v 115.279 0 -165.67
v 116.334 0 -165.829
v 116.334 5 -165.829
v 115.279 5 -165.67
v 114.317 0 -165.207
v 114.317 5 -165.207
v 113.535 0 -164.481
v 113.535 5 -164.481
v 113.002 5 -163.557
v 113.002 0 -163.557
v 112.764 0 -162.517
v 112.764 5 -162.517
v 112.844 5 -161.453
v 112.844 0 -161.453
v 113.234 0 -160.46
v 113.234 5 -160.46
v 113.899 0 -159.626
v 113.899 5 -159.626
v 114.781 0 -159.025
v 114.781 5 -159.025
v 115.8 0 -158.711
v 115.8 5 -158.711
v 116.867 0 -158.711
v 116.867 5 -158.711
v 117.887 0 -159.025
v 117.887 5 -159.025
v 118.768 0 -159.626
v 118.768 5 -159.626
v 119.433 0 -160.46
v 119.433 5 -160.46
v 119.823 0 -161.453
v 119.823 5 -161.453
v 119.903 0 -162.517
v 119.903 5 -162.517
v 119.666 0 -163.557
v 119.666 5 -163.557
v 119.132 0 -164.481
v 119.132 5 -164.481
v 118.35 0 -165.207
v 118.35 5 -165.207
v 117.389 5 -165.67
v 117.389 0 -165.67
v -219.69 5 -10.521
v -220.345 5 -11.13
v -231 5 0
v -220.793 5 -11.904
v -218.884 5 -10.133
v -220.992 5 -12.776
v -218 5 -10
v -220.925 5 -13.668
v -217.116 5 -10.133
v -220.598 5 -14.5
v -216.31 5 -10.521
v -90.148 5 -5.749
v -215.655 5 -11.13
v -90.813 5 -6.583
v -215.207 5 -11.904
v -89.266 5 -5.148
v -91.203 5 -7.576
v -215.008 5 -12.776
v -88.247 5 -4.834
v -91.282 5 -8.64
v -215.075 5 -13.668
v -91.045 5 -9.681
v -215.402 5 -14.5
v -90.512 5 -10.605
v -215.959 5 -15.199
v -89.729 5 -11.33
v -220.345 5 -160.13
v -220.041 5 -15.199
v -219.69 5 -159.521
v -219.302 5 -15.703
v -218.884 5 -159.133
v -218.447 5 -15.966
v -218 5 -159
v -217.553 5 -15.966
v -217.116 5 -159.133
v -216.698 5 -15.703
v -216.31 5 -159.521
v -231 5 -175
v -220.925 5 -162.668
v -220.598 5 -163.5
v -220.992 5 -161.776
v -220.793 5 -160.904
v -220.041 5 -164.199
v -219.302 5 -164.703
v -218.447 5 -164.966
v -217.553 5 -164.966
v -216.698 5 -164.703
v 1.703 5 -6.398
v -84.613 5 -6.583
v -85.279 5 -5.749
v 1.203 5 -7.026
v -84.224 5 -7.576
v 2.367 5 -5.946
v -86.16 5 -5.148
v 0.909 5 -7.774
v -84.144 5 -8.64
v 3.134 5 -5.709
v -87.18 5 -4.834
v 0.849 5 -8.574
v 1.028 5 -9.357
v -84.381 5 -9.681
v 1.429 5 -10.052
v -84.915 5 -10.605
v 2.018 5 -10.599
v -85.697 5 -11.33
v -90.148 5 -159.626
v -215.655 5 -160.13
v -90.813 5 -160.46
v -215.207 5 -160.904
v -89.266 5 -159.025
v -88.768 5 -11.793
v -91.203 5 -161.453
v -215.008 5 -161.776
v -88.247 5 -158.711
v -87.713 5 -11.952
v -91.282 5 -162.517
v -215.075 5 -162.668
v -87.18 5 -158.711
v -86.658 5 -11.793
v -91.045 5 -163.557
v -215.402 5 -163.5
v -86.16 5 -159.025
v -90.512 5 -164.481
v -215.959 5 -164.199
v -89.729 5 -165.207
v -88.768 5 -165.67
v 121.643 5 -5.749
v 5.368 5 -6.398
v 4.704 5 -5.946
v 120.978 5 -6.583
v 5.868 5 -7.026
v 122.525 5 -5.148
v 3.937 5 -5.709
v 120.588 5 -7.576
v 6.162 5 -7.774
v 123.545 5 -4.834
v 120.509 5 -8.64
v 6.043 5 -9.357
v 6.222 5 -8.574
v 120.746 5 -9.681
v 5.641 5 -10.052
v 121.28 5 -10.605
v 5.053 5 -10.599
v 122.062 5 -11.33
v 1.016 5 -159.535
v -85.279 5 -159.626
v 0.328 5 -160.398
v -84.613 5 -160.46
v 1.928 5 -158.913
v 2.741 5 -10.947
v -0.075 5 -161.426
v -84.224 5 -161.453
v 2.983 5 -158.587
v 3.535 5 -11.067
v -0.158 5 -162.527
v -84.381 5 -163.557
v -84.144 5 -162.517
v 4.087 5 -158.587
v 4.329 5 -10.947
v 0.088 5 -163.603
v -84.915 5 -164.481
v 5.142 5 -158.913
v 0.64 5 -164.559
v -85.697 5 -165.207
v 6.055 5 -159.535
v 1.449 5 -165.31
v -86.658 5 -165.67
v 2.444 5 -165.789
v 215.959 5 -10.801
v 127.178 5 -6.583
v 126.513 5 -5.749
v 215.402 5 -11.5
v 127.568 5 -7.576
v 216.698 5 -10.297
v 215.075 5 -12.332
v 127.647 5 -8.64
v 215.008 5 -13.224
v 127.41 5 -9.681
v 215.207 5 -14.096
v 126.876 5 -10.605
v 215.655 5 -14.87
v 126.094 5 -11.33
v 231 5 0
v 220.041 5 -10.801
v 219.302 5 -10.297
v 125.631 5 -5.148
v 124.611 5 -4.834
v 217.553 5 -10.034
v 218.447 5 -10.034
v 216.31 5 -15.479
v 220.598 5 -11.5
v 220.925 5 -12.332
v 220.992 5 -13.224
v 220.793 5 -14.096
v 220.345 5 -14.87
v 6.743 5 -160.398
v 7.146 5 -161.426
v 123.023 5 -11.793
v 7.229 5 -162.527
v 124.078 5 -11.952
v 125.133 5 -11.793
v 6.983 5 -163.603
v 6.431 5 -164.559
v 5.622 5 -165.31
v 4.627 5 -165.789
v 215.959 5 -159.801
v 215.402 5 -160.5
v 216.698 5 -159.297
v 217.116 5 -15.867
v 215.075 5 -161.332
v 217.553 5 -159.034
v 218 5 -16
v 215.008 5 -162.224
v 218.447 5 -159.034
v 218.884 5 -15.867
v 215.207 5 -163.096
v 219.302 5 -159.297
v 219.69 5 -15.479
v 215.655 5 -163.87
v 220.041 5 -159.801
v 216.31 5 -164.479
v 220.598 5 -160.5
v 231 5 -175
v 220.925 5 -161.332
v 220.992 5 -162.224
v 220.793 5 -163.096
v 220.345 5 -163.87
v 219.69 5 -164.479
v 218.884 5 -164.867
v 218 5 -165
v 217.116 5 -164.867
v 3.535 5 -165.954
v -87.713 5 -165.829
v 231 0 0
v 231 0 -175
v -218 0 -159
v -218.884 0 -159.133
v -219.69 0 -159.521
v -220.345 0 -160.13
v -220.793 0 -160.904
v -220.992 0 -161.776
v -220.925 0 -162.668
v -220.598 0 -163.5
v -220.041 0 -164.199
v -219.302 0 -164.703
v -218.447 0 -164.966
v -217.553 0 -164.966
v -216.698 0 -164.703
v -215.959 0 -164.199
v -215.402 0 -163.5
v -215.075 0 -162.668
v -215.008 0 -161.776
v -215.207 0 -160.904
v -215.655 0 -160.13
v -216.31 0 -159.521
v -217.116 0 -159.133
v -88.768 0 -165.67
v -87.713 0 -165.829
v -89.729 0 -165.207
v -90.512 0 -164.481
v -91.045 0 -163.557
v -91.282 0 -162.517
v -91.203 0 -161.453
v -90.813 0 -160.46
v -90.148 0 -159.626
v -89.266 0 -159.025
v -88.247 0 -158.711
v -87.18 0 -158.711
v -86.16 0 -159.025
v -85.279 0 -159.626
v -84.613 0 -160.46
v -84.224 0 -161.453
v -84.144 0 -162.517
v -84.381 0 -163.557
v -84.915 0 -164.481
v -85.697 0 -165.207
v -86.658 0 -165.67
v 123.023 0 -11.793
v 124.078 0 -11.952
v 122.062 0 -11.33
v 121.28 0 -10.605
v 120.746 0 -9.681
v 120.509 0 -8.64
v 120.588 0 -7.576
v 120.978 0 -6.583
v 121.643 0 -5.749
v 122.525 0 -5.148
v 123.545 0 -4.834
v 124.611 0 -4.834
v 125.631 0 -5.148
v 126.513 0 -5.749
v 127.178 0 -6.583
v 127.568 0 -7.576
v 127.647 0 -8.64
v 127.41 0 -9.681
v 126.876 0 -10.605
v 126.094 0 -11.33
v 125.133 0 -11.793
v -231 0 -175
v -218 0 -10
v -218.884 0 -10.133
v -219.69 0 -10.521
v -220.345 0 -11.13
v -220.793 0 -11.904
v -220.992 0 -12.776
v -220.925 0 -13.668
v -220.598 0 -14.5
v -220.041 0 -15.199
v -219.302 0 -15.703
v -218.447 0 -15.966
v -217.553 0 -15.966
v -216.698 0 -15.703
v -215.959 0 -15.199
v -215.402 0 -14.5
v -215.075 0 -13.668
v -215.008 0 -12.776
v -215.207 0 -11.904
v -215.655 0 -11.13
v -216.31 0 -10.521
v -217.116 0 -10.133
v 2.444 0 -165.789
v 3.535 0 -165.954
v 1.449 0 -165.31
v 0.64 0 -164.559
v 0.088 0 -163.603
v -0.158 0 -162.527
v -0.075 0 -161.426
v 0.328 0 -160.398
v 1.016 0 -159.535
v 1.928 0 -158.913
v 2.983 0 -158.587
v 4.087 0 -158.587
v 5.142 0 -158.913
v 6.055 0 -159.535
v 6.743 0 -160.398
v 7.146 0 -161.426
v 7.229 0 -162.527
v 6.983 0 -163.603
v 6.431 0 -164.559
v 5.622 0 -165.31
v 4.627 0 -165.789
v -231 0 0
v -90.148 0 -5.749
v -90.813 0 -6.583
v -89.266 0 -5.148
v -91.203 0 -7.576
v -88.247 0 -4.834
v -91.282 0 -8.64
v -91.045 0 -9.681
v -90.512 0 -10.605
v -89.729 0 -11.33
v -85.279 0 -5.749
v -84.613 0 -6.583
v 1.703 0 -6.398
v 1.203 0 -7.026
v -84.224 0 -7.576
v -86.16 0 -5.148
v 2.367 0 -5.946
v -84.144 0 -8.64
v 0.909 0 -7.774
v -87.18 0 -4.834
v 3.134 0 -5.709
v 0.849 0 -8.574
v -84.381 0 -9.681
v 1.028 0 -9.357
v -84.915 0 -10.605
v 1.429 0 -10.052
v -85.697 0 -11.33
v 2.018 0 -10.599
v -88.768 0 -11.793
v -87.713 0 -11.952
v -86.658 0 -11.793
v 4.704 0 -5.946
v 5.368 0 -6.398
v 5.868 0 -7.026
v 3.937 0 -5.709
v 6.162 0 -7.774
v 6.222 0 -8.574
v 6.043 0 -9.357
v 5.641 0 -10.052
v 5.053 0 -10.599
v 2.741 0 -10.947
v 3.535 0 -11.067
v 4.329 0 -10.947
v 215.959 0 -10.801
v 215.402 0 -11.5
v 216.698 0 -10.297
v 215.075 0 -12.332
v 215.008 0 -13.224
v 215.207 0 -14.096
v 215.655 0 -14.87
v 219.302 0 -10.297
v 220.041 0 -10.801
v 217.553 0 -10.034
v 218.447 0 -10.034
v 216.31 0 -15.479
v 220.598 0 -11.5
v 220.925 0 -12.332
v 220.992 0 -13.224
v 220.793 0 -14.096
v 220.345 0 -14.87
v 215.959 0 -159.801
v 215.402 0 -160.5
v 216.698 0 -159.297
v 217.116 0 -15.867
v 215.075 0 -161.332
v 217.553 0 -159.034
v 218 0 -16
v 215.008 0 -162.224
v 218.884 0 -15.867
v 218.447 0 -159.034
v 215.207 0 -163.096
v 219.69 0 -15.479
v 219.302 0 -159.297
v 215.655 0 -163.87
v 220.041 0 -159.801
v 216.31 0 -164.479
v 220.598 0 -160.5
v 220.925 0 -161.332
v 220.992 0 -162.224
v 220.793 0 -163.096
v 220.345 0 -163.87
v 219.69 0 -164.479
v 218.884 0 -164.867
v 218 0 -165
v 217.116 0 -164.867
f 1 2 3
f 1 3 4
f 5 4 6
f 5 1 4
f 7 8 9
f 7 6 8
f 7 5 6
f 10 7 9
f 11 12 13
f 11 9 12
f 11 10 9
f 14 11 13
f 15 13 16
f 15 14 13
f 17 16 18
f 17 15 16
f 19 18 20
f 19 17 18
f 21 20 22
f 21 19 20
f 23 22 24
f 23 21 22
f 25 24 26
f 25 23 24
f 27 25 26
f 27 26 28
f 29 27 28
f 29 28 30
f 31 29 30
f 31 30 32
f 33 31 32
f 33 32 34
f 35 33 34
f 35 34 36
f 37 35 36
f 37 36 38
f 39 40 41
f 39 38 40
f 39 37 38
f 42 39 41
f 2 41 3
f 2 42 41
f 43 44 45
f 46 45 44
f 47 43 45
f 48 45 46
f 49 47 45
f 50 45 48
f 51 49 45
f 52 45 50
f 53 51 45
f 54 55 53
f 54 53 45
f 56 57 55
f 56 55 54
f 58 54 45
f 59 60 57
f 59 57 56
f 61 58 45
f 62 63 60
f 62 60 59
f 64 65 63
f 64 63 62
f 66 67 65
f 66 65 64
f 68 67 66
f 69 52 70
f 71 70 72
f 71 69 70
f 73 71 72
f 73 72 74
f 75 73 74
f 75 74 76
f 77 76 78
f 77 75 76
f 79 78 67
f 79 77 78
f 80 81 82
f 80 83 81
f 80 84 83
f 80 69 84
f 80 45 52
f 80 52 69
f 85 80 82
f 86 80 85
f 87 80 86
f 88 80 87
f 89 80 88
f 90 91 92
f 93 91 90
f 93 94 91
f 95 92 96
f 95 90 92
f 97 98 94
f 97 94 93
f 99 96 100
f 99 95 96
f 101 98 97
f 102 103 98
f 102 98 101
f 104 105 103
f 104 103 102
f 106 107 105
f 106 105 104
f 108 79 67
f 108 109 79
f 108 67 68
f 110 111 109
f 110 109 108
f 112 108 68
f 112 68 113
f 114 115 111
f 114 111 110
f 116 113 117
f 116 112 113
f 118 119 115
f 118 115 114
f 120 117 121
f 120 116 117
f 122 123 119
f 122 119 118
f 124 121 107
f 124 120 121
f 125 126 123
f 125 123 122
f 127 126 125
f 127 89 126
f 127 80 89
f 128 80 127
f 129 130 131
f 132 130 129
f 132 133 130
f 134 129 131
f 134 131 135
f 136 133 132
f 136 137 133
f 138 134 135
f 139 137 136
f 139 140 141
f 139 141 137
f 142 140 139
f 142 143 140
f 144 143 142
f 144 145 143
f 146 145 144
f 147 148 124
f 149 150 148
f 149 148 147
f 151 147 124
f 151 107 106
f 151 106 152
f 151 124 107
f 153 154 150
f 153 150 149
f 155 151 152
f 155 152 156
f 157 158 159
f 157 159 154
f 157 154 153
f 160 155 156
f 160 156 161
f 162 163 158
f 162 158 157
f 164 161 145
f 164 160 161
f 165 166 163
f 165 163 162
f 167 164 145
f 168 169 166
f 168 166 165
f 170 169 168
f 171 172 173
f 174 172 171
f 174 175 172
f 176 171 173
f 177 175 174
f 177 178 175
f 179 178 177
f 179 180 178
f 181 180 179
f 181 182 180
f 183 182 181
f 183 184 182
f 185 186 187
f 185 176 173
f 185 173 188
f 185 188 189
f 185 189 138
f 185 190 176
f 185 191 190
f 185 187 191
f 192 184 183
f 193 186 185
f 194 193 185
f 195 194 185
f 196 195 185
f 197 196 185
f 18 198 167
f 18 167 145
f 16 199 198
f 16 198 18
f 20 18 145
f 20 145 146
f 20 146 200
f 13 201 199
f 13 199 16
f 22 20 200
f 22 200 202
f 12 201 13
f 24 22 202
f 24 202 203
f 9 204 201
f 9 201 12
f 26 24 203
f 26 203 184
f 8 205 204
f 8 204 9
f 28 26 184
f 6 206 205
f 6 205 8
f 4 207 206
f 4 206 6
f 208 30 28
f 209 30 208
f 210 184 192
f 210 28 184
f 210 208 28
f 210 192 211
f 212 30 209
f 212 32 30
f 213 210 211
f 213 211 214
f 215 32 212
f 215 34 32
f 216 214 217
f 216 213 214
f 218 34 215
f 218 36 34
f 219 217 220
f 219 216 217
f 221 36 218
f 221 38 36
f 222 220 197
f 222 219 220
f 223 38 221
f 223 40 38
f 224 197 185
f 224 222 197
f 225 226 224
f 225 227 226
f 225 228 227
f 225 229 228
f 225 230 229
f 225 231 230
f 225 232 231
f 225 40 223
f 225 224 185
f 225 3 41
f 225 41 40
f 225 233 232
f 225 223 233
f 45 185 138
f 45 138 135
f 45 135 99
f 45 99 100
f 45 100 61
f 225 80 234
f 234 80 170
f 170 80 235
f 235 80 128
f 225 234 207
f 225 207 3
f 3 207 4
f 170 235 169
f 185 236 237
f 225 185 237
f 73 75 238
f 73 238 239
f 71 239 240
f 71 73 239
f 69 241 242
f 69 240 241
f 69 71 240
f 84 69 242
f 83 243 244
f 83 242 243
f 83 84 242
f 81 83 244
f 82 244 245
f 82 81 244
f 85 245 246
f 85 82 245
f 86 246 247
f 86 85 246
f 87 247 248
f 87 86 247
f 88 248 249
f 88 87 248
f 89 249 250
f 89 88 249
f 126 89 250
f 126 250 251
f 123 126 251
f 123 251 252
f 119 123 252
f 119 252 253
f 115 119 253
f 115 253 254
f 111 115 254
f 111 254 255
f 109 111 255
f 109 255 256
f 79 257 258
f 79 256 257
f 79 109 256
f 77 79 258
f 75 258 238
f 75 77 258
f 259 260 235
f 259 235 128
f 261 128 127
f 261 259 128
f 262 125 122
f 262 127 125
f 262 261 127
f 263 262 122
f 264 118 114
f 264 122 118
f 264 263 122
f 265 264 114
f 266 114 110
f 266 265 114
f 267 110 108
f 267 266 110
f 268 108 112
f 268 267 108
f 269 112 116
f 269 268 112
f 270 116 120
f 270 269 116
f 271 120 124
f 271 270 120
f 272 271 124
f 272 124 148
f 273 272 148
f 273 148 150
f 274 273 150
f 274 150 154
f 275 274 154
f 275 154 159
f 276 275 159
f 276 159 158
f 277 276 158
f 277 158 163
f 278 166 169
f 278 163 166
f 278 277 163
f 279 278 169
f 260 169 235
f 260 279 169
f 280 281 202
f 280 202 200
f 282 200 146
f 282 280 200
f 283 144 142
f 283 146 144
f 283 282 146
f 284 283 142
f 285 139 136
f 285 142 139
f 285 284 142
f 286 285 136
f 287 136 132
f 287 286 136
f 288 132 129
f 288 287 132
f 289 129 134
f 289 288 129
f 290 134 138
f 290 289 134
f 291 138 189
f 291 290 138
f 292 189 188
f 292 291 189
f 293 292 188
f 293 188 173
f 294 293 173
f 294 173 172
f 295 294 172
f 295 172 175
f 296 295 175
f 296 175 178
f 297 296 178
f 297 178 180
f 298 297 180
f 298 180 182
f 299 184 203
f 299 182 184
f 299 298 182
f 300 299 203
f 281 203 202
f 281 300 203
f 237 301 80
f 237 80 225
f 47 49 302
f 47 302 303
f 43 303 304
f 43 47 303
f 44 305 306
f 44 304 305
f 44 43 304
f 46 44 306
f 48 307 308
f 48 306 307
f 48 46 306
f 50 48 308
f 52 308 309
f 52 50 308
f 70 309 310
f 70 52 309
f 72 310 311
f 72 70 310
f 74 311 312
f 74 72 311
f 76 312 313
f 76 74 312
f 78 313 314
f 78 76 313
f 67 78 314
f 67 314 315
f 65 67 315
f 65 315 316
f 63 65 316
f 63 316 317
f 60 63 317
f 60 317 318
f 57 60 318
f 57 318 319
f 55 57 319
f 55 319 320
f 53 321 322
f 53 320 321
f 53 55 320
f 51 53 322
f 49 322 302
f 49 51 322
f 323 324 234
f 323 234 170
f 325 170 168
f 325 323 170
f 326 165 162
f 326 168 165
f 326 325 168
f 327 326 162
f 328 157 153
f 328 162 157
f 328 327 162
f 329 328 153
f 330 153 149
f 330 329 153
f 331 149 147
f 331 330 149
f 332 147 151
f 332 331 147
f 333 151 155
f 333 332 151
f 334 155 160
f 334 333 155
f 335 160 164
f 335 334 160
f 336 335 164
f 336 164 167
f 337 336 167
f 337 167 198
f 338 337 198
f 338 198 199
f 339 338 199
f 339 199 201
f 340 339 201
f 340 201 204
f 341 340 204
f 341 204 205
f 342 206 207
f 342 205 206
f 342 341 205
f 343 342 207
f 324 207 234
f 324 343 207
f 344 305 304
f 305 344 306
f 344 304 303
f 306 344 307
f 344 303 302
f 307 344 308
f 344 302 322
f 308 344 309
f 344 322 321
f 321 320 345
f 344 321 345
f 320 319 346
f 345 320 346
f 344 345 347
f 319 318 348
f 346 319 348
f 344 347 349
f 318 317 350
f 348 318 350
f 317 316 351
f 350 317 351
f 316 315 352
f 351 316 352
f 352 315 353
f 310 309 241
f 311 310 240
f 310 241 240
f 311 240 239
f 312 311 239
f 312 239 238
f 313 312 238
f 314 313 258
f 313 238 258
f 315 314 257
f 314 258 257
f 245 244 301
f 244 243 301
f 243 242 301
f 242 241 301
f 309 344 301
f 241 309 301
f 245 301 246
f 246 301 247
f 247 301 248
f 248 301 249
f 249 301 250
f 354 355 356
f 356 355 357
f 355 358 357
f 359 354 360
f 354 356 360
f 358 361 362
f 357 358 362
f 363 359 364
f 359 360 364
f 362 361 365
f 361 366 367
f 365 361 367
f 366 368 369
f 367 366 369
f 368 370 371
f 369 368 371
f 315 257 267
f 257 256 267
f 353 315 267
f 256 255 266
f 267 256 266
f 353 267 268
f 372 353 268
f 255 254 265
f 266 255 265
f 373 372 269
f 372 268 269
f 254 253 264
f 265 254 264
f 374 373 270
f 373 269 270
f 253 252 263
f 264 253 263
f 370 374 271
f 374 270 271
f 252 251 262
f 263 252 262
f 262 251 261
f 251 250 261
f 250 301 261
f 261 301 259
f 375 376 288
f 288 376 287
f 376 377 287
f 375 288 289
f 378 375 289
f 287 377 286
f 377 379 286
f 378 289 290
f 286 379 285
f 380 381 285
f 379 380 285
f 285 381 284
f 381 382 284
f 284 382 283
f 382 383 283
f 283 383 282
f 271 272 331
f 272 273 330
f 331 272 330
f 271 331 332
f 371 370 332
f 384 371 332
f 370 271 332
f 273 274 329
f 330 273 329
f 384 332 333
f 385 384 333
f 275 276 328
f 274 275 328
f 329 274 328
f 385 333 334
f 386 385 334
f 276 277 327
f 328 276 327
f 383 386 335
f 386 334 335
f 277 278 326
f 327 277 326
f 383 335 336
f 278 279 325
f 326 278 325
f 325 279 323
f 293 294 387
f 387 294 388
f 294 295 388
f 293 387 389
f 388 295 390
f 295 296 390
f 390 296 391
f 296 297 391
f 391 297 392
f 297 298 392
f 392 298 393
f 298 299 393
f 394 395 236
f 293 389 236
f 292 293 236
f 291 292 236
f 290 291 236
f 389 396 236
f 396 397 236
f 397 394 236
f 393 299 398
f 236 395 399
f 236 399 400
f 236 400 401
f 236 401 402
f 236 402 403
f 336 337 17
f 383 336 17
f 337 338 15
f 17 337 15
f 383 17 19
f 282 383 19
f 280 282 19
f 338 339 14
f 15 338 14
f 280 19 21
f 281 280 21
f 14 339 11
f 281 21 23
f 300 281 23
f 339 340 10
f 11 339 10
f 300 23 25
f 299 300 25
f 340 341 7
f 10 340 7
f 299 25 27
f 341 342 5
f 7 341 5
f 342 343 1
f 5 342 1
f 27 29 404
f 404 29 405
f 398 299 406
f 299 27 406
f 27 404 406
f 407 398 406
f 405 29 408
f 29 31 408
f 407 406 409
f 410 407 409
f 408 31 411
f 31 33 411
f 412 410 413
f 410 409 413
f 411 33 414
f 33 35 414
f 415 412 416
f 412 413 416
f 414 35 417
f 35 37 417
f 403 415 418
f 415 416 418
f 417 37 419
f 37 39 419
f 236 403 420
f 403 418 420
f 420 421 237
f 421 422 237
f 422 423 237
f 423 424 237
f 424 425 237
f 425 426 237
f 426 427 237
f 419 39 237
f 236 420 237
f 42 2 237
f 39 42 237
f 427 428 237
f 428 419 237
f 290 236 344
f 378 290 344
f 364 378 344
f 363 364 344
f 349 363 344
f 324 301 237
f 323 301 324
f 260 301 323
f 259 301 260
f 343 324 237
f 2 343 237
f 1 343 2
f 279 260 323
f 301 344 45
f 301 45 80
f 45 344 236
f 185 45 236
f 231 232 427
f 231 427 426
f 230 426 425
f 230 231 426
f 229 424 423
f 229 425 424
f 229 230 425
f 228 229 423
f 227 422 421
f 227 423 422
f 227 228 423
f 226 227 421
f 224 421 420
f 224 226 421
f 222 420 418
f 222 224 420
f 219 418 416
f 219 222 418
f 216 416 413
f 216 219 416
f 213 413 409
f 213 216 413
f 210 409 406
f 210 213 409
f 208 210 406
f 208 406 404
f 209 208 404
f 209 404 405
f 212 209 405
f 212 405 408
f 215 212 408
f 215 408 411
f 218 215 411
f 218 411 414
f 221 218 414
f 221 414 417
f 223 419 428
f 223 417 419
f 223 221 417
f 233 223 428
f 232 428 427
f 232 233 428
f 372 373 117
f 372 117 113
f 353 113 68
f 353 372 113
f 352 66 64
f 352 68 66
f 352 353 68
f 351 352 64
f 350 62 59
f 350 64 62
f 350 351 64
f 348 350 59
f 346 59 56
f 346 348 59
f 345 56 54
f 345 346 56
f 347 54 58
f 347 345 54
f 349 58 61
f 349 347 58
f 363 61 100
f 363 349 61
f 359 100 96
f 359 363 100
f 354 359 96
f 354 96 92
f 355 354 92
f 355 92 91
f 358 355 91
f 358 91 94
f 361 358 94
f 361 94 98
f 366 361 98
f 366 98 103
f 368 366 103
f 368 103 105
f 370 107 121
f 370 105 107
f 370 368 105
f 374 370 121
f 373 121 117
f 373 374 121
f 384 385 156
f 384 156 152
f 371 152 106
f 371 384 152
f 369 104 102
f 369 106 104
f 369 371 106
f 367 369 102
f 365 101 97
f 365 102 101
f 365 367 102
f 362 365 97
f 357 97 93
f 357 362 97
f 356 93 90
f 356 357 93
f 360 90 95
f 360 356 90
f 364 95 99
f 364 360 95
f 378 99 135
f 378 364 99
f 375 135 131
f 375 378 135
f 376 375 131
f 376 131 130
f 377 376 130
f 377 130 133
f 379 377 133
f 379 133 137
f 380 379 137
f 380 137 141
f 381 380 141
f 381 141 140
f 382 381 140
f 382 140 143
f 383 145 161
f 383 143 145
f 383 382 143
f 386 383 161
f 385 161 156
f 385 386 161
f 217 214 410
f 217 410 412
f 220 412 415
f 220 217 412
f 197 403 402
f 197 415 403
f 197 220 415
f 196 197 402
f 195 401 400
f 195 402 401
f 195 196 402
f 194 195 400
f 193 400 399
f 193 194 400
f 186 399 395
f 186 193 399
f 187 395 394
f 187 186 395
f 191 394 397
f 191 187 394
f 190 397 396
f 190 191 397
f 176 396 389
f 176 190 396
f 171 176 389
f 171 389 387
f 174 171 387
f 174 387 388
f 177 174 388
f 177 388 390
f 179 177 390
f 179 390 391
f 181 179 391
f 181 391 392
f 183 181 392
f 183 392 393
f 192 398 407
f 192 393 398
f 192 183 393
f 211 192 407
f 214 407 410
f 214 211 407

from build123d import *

# Parameters (mm, degrees)
SKETCH_1_W               = 462
SKETCH_1_H               = 175
EXTRUDE_1_DEPTH          = 5
CUT_EXTRUDE_1_DEPTH      = 290.846511105
CUT_EXTRUDE_1_DEPTH_BACK = 290.846511105
SKETCH_2_R               = 3
CUT_EXTRUDE_3_DEPTH      = 290.846511105
CUT_EXTRUDE_3_DEPTH_BACK = 290.846511105
SKETCH_5_R               = 3.579286829
SKETCH_5_R_2             = 3.703820796
SKETCH_5_R_3             = 2.693687851


with BuildPart() as part:
    # 草图1 → 凸台-拉伸1 (new body)
    with BuildSketch(Plane(origin=(0, 0, 0), x_dir=(1, 0, 0), z_dir=(0, 1, 0))):
        with Locations((0, 87.5)):
            Rectangle(SKETCH_1_W, SKETCH_1_H)
    extrude(amount=EXTRUDE_1_DEPTH)

    # 草图2 → 切除-拉伸1 (cut, two sides: drawn at the far end of the back side and taken through both)
    with BuildSketch(Plane.XZ.offset(-CUT_EXTRUDE_1_DEPTH_BACK)):
        with Locations((218, -162)):
            Circle(SKETCH_2_R)
        with Locations((218, -13)):
            Circle(SKETCH_2_R)
        with Locations((-218, -13)):
            Circle(SKETCH_2_R)
        with Locations((-218, -162)):
            Circle(SKETCH_2_R)
    extrude(amount=CUT_EXTRUDE_1_DEPTH + CUT_EXTRUDE_1_DEPTH_BACK, mode=Mode.SUBTRACT)

    # 草图5 → 切除-拉伸3 (cut, two sides: drawn at the far end of the back side and taken through both)
    with BuildSketch(Plane(origin=(0, 5, 0), x_dir=(1, 0, 0), z_dir=(0, 1, 0)).offset(-CUT_EXTRUDE_3_DEPTH_BACK)):
        with Locations((-87.713210657, 162.249837873)):
            Circle(SKETCH_5_R)
        with Locations((-87.713210657, 8.372919369)):
            Circle(SKETCH_5_R)
        with Locations((116.333644077, 162.249837873)):
            Circle(SKETCH_5_R)
        with Locations((124.077996649, 8.372919369)):
            Circle(SKETCH_5_R)
        with Locations((3.535465305, 162.249837873)):
            Circle(SKETCH_5_R_2)
        with Locations((3.535465305, 8.372919369)):
            Circle(SKETCH_5_R_3)
    extrude(amount=CUT_EXTRUDE_3_DEPTH + CUT_EXTRUDE_3_DEPTH_BACK, mode=Mode.SUBTRACT)


solid = part.part
